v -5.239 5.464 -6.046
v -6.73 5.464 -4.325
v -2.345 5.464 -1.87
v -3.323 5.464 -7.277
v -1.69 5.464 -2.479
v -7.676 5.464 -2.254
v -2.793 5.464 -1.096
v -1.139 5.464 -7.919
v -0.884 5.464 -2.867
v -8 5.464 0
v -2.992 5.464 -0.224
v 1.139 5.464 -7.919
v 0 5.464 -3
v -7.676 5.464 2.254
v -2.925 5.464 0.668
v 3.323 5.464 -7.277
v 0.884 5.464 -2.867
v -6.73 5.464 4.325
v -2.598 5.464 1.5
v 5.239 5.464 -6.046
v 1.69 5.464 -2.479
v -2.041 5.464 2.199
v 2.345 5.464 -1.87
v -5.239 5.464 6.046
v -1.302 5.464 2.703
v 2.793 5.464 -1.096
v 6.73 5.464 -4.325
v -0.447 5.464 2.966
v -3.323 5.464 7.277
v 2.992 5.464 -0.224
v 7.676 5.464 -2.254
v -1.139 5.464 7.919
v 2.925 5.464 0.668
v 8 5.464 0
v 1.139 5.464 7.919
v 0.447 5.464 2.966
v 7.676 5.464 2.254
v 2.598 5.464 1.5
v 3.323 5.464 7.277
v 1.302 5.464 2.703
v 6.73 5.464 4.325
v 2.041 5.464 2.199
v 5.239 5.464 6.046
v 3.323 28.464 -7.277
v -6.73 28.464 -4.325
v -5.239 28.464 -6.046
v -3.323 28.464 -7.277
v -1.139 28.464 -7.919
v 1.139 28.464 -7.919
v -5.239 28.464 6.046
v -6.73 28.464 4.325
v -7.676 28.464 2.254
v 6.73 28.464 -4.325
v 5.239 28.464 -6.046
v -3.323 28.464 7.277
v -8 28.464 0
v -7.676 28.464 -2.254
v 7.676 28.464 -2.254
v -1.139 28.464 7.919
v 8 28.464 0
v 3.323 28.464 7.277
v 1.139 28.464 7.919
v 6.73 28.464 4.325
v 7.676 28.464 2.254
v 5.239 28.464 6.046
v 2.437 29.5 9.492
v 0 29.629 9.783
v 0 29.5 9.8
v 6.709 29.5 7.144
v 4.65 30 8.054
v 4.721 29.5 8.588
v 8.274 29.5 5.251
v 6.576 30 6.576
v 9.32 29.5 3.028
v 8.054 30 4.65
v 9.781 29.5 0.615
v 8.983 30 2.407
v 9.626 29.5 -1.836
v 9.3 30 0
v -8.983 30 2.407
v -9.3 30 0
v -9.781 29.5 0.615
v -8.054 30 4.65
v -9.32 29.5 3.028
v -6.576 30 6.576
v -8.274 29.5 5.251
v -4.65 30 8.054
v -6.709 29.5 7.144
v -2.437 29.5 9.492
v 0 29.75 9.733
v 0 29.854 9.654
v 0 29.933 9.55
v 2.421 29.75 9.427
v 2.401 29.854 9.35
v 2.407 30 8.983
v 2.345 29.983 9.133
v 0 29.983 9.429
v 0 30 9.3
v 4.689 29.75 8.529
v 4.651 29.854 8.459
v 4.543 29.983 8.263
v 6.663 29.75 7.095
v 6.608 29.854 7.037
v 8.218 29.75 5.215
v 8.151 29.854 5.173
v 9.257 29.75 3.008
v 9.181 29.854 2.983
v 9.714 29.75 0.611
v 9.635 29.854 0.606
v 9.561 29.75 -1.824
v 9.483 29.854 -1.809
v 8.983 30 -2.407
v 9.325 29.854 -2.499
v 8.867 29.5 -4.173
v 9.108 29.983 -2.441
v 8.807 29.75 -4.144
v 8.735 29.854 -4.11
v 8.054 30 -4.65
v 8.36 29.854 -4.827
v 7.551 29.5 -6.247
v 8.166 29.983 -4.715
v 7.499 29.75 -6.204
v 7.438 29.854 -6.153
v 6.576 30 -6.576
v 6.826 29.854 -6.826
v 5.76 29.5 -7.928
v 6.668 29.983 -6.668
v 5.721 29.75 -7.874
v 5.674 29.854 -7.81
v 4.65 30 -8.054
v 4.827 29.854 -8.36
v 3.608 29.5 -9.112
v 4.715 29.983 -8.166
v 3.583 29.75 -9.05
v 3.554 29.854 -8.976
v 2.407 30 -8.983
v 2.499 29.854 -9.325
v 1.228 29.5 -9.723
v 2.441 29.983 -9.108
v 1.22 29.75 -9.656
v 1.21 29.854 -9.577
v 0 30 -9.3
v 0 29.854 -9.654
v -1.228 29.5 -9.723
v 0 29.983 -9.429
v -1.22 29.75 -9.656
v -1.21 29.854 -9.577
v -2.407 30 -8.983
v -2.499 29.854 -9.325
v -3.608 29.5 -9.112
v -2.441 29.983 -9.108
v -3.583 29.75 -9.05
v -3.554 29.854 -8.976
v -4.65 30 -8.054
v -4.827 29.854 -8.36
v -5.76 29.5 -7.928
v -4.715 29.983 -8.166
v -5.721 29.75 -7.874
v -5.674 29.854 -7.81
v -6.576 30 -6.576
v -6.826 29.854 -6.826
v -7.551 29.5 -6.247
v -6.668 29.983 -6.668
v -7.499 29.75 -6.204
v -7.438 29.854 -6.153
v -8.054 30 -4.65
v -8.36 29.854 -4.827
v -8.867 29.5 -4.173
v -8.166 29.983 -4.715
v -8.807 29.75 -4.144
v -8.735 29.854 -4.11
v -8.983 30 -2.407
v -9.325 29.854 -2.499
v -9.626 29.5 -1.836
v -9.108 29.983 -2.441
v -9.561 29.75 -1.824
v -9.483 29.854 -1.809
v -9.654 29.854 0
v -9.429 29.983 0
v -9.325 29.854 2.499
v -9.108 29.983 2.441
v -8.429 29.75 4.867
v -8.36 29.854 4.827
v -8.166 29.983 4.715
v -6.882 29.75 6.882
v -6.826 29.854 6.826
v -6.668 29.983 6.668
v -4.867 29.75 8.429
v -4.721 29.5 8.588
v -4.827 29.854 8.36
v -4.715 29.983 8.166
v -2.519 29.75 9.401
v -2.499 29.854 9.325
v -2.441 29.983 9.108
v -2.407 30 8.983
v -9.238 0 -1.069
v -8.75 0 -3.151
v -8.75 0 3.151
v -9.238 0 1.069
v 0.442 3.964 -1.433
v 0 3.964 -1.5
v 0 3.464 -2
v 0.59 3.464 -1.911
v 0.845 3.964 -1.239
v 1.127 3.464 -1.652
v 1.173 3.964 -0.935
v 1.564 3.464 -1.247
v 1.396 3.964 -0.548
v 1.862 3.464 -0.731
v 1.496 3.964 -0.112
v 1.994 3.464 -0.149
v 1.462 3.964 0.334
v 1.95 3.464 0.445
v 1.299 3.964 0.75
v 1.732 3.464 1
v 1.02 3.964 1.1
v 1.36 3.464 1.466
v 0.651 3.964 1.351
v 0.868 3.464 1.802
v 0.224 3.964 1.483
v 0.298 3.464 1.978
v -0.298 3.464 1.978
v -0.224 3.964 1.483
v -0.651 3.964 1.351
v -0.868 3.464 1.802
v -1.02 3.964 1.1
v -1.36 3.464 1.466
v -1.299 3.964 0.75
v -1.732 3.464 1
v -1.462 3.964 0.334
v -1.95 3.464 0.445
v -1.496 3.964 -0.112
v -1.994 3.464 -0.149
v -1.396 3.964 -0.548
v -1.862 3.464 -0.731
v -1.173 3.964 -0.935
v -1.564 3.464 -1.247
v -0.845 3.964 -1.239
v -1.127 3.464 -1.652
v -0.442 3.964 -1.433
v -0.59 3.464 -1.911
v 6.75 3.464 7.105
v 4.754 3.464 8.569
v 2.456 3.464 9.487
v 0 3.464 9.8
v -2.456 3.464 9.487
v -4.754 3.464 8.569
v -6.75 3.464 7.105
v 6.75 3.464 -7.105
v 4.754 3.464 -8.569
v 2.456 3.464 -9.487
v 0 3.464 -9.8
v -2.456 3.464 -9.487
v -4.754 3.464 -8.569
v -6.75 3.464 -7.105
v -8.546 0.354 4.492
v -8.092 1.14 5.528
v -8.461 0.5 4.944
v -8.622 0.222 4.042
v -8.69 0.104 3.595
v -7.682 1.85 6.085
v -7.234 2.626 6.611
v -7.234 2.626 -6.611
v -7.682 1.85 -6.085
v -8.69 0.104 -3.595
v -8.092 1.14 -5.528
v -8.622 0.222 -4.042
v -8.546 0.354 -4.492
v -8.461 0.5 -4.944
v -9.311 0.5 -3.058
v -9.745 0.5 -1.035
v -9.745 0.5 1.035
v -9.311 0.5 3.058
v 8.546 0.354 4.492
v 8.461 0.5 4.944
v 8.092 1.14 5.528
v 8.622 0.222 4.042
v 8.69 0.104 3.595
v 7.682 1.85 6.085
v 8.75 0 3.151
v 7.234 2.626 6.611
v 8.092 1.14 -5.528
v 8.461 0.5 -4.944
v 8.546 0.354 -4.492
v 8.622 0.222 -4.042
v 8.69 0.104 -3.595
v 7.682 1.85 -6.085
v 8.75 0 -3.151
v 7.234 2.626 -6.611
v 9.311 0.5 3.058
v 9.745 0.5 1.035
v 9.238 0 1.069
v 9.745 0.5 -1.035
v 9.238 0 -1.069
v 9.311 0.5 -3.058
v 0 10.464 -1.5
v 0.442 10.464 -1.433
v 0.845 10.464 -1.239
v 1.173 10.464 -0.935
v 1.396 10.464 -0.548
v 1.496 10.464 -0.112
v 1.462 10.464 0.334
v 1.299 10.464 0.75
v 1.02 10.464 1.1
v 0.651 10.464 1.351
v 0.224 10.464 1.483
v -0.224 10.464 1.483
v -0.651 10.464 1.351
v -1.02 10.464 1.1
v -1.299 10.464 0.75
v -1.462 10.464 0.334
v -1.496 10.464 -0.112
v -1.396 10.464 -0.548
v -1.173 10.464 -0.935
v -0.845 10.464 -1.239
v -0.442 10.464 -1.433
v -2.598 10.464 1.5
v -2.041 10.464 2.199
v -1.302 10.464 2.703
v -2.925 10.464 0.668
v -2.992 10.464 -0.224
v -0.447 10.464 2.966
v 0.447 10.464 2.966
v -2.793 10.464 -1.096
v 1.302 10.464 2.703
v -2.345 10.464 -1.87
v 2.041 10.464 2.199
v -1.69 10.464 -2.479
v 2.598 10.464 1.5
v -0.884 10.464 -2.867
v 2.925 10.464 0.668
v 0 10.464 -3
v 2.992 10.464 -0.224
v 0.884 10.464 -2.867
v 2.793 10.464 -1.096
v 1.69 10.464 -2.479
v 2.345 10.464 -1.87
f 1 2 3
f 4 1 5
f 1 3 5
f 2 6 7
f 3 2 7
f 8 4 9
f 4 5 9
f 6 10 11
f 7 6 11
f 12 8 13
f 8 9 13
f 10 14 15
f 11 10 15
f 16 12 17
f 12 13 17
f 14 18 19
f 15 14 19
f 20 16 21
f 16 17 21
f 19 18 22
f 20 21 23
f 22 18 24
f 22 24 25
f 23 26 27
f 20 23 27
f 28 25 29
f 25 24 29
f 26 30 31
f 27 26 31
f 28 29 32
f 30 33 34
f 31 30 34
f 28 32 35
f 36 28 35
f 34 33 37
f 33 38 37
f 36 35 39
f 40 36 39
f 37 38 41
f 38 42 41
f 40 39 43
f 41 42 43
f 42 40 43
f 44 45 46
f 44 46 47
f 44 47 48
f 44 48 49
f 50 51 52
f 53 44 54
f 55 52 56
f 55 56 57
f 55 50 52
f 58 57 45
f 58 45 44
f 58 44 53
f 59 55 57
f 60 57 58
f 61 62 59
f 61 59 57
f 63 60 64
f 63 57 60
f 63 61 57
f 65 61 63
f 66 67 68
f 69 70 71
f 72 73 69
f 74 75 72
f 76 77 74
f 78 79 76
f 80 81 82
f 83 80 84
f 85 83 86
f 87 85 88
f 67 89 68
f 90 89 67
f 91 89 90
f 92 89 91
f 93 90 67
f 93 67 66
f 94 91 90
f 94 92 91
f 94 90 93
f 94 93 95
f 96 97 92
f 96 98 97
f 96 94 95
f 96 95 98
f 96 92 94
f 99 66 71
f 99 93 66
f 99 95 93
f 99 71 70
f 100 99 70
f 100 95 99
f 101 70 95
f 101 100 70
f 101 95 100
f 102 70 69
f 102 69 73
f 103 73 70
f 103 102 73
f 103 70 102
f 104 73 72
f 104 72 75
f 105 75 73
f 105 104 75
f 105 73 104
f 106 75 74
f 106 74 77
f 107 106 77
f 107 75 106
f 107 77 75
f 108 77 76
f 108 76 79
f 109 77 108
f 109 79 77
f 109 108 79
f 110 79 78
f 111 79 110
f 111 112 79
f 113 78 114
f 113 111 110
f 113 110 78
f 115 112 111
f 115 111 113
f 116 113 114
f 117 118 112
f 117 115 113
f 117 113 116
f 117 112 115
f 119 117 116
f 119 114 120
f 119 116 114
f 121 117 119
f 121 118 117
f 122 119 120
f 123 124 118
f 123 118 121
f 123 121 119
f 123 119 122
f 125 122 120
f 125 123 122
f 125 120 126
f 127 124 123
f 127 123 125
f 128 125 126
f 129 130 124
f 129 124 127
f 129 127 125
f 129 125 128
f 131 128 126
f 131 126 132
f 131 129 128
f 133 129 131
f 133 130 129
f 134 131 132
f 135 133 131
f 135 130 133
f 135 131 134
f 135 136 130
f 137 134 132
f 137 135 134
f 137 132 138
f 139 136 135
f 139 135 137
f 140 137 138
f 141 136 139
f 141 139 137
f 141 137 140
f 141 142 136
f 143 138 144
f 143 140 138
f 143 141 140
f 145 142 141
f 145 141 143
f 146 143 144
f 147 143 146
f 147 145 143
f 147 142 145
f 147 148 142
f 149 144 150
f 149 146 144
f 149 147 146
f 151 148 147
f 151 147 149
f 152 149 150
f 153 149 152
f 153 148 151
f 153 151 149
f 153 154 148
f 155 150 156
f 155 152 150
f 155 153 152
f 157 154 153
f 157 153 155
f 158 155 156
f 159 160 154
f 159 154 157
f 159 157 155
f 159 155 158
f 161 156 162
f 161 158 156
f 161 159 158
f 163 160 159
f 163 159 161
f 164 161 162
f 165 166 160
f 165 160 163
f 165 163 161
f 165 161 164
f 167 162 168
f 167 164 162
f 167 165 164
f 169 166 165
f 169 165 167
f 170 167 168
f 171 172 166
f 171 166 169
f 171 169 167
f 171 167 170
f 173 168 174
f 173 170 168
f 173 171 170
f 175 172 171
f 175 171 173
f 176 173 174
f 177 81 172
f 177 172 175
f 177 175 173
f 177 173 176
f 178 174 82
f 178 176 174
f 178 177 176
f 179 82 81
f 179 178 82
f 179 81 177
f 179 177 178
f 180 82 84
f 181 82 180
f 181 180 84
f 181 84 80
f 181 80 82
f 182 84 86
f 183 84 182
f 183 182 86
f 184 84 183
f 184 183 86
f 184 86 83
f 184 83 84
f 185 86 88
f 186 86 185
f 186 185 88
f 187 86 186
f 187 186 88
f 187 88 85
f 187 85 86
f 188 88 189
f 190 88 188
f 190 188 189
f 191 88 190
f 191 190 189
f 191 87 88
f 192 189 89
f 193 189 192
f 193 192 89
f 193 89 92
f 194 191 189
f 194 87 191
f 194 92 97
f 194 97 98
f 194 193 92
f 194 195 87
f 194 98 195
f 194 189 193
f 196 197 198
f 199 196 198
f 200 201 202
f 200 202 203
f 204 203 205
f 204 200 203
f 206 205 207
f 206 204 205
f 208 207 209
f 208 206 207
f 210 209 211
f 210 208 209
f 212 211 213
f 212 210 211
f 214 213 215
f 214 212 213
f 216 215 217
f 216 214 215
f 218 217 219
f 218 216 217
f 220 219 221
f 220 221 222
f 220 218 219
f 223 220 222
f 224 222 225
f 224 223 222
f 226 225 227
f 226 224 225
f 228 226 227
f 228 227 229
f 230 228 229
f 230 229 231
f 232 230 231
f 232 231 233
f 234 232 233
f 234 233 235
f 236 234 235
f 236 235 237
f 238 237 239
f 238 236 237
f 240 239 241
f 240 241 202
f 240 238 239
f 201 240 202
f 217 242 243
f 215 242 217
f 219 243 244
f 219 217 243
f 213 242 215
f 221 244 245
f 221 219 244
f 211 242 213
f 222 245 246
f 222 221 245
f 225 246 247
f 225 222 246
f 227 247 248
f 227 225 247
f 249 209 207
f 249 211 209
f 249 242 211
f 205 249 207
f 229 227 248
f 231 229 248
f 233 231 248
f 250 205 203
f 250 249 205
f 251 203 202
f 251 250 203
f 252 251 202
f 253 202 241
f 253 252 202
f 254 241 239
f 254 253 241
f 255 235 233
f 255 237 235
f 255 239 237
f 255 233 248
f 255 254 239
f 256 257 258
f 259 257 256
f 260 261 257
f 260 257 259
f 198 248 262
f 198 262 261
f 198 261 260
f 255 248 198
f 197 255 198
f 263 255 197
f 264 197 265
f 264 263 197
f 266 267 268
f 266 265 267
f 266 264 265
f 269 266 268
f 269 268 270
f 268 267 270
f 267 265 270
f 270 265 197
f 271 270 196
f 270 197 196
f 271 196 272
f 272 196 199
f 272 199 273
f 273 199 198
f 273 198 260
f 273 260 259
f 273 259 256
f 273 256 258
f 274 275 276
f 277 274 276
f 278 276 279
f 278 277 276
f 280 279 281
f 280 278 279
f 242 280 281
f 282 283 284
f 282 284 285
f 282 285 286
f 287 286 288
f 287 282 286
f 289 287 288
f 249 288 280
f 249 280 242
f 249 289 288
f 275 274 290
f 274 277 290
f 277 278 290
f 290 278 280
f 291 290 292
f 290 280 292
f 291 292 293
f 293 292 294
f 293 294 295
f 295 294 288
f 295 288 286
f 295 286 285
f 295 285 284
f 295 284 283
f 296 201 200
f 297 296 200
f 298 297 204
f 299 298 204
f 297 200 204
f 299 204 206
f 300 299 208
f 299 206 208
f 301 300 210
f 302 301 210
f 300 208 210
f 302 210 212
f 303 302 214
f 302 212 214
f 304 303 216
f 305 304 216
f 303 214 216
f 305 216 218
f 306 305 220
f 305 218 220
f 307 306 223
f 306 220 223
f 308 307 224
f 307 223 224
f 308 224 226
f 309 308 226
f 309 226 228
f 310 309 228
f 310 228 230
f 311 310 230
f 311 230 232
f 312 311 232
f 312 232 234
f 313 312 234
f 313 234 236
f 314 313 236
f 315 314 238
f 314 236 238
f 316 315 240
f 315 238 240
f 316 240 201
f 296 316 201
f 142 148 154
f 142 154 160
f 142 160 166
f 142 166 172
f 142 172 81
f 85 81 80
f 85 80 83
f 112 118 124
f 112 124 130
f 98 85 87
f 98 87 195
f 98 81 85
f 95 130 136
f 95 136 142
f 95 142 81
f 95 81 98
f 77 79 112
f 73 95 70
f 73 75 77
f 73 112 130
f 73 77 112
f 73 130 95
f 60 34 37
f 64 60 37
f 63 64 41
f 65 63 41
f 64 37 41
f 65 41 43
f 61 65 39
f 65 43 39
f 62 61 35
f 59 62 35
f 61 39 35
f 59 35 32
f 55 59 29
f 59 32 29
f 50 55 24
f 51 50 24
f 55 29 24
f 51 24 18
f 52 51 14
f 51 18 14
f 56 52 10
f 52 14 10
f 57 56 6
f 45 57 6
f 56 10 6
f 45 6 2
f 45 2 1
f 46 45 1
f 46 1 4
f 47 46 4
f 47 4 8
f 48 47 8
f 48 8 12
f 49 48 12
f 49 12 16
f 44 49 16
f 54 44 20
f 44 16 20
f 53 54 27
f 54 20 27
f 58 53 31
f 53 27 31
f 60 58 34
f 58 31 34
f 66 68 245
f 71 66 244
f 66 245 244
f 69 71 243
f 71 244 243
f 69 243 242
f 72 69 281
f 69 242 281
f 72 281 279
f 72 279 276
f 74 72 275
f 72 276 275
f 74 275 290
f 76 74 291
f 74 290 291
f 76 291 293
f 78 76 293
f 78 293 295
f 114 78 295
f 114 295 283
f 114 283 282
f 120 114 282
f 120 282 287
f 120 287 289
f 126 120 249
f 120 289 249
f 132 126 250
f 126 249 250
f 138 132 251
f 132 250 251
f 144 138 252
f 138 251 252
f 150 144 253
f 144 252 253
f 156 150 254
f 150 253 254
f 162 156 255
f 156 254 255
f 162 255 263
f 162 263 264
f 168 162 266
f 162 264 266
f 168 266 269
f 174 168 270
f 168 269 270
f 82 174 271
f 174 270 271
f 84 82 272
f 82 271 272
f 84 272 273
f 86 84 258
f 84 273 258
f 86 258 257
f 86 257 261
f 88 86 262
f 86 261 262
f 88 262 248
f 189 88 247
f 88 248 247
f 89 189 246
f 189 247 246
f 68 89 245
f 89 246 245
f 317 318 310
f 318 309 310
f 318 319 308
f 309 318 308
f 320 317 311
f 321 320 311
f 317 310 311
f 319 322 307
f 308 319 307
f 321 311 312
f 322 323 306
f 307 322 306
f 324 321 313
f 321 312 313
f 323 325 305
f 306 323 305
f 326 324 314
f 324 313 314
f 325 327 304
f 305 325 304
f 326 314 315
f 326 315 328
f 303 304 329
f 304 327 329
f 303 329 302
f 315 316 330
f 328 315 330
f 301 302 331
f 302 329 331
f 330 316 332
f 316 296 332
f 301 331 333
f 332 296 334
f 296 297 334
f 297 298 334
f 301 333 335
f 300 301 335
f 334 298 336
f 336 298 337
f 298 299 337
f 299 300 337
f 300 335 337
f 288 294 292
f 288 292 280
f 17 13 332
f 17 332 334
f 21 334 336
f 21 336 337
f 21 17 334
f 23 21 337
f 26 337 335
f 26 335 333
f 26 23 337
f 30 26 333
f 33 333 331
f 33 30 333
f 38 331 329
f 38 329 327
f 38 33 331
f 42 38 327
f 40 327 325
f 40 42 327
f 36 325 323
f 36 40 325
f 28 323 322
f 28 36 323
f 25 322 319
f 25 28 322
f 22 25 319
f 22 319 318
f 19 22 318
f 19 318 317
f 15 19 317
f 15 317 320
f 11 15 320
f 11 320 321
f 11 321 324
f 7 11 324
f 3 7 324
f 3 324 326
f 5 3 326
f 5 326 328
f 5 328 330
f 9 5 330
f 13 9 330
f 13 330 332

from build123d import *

# Parameters (mm, degrees)
SKETCH_1_R               = 9.8
EXTRUDE_1_DEPTH          = 30
FILLET_1_R               = 0.5
CUT_EXTRUDE_1_DEPTH      = 34.046633746
CUT_EXTRUDE_1_DEPTH_BACK = 34.046633746
CUT_EXTRUDE_START        = -2
SKETCH_5_R               = 8
CUT_EXTRUDE_2_DEPTH      = 23
CHAMFER_1_SIZE           = 0.5
SKETCH_7_R               = 1.5
CUT_EXTRUDE_4_DEPTH      = 7
SKETCH_9_R               = 3
SKETCH_9_R_2             = 1.5
EXTRUDE_2_DEPTH          = 7
CHAMFER_2_SIZE           = 0.5


with BuildPart() as part:
    # 草图1 → 凸台-拉伸1 (new body)
    with BuildSketch(Plane(origin=(0, 0, 0), x_dir=(1, 0, 0), z_dir=(0, 1, 0))):
        Circle(SKETCH_1_R)
    extrude(amount=EXTRUDE_1_DEPTH)

    # 圆角1
    fillet_1_edges = [part.edges().sort_by_distance(p)[0] for p in [
        (-9.8, 30, 0),
    ]]
    fillet(fillet_1_edges, radius=FILLET_1_R)

    # 草图4 → 切除-拉伸1 (cut, two sides: drawn at the far end of the back side and taken through both)
    with BuildSketch(Plane.XY.offset(-CUT_EXTRUDE_1_DEPTH_BACK)):
        Polygon((6.75, 3.464101615), (-6.75, 3.464101615), (-8.75, 0), (8.75, 0), align=None)
    extrude(amount=CUT_EXTRUDE_1_DEPTH + CUT_EXTRUDE_1_DEPTH_BACK, mode=Mode.SUBTRACT)

    # 草图5 → 切除-拉伸2 (cut)
    with BuildSketch(Plane.XZ.offset(-3.464101615).offset(CUT_EXTRUDE_START)):
        Circle(SKETCH_5_R)
    extrude(amount=-CUT_EXTRUDE_2_DEPTH, mode=Mode.SUBTRACT)

    # 倒角1
    chamfer_1_edges = [part.edges().sort_by_distance(p)[0] for p in [
        (-9.8, 0, 0),
        (9.53388693, 0, 2.268259244),
    ]]
    chamfer(chamfer_1_edges, length=CHAMFER_1_SIZE)

    # 草图7 → 切除-拉伸4 (cut)
    with BuildSketch(Plane.XZ.offset(-3.464101615)):
        Circle(SKETCH_7_R)
    extrude(amount=-CUT_EXTRUDE_4_DEPTH, mode=Mode.SUBTRACT)

    # 草图9 → 凸台-拉伸2 (add)
    with BuildSketch(Plane.XZ.offset(-3.464101615)):
        Circle(SKETCH_9_R)
        Circle(SKETCH_9_R_2, mode=Mode.SUBTRACT)
    extrude(amount=-EXTRUDE_2_DEPTH)

    # 倒角2
    chamfer_2_edges = [part.edges().sort_by_distance(p)[0] for p in [
        (-1.5, 3.464101615, 0),
    ]]
    chamfer(chamfer_2_edges, length=CHAMFER_2_SIZE)


solid = part.part
